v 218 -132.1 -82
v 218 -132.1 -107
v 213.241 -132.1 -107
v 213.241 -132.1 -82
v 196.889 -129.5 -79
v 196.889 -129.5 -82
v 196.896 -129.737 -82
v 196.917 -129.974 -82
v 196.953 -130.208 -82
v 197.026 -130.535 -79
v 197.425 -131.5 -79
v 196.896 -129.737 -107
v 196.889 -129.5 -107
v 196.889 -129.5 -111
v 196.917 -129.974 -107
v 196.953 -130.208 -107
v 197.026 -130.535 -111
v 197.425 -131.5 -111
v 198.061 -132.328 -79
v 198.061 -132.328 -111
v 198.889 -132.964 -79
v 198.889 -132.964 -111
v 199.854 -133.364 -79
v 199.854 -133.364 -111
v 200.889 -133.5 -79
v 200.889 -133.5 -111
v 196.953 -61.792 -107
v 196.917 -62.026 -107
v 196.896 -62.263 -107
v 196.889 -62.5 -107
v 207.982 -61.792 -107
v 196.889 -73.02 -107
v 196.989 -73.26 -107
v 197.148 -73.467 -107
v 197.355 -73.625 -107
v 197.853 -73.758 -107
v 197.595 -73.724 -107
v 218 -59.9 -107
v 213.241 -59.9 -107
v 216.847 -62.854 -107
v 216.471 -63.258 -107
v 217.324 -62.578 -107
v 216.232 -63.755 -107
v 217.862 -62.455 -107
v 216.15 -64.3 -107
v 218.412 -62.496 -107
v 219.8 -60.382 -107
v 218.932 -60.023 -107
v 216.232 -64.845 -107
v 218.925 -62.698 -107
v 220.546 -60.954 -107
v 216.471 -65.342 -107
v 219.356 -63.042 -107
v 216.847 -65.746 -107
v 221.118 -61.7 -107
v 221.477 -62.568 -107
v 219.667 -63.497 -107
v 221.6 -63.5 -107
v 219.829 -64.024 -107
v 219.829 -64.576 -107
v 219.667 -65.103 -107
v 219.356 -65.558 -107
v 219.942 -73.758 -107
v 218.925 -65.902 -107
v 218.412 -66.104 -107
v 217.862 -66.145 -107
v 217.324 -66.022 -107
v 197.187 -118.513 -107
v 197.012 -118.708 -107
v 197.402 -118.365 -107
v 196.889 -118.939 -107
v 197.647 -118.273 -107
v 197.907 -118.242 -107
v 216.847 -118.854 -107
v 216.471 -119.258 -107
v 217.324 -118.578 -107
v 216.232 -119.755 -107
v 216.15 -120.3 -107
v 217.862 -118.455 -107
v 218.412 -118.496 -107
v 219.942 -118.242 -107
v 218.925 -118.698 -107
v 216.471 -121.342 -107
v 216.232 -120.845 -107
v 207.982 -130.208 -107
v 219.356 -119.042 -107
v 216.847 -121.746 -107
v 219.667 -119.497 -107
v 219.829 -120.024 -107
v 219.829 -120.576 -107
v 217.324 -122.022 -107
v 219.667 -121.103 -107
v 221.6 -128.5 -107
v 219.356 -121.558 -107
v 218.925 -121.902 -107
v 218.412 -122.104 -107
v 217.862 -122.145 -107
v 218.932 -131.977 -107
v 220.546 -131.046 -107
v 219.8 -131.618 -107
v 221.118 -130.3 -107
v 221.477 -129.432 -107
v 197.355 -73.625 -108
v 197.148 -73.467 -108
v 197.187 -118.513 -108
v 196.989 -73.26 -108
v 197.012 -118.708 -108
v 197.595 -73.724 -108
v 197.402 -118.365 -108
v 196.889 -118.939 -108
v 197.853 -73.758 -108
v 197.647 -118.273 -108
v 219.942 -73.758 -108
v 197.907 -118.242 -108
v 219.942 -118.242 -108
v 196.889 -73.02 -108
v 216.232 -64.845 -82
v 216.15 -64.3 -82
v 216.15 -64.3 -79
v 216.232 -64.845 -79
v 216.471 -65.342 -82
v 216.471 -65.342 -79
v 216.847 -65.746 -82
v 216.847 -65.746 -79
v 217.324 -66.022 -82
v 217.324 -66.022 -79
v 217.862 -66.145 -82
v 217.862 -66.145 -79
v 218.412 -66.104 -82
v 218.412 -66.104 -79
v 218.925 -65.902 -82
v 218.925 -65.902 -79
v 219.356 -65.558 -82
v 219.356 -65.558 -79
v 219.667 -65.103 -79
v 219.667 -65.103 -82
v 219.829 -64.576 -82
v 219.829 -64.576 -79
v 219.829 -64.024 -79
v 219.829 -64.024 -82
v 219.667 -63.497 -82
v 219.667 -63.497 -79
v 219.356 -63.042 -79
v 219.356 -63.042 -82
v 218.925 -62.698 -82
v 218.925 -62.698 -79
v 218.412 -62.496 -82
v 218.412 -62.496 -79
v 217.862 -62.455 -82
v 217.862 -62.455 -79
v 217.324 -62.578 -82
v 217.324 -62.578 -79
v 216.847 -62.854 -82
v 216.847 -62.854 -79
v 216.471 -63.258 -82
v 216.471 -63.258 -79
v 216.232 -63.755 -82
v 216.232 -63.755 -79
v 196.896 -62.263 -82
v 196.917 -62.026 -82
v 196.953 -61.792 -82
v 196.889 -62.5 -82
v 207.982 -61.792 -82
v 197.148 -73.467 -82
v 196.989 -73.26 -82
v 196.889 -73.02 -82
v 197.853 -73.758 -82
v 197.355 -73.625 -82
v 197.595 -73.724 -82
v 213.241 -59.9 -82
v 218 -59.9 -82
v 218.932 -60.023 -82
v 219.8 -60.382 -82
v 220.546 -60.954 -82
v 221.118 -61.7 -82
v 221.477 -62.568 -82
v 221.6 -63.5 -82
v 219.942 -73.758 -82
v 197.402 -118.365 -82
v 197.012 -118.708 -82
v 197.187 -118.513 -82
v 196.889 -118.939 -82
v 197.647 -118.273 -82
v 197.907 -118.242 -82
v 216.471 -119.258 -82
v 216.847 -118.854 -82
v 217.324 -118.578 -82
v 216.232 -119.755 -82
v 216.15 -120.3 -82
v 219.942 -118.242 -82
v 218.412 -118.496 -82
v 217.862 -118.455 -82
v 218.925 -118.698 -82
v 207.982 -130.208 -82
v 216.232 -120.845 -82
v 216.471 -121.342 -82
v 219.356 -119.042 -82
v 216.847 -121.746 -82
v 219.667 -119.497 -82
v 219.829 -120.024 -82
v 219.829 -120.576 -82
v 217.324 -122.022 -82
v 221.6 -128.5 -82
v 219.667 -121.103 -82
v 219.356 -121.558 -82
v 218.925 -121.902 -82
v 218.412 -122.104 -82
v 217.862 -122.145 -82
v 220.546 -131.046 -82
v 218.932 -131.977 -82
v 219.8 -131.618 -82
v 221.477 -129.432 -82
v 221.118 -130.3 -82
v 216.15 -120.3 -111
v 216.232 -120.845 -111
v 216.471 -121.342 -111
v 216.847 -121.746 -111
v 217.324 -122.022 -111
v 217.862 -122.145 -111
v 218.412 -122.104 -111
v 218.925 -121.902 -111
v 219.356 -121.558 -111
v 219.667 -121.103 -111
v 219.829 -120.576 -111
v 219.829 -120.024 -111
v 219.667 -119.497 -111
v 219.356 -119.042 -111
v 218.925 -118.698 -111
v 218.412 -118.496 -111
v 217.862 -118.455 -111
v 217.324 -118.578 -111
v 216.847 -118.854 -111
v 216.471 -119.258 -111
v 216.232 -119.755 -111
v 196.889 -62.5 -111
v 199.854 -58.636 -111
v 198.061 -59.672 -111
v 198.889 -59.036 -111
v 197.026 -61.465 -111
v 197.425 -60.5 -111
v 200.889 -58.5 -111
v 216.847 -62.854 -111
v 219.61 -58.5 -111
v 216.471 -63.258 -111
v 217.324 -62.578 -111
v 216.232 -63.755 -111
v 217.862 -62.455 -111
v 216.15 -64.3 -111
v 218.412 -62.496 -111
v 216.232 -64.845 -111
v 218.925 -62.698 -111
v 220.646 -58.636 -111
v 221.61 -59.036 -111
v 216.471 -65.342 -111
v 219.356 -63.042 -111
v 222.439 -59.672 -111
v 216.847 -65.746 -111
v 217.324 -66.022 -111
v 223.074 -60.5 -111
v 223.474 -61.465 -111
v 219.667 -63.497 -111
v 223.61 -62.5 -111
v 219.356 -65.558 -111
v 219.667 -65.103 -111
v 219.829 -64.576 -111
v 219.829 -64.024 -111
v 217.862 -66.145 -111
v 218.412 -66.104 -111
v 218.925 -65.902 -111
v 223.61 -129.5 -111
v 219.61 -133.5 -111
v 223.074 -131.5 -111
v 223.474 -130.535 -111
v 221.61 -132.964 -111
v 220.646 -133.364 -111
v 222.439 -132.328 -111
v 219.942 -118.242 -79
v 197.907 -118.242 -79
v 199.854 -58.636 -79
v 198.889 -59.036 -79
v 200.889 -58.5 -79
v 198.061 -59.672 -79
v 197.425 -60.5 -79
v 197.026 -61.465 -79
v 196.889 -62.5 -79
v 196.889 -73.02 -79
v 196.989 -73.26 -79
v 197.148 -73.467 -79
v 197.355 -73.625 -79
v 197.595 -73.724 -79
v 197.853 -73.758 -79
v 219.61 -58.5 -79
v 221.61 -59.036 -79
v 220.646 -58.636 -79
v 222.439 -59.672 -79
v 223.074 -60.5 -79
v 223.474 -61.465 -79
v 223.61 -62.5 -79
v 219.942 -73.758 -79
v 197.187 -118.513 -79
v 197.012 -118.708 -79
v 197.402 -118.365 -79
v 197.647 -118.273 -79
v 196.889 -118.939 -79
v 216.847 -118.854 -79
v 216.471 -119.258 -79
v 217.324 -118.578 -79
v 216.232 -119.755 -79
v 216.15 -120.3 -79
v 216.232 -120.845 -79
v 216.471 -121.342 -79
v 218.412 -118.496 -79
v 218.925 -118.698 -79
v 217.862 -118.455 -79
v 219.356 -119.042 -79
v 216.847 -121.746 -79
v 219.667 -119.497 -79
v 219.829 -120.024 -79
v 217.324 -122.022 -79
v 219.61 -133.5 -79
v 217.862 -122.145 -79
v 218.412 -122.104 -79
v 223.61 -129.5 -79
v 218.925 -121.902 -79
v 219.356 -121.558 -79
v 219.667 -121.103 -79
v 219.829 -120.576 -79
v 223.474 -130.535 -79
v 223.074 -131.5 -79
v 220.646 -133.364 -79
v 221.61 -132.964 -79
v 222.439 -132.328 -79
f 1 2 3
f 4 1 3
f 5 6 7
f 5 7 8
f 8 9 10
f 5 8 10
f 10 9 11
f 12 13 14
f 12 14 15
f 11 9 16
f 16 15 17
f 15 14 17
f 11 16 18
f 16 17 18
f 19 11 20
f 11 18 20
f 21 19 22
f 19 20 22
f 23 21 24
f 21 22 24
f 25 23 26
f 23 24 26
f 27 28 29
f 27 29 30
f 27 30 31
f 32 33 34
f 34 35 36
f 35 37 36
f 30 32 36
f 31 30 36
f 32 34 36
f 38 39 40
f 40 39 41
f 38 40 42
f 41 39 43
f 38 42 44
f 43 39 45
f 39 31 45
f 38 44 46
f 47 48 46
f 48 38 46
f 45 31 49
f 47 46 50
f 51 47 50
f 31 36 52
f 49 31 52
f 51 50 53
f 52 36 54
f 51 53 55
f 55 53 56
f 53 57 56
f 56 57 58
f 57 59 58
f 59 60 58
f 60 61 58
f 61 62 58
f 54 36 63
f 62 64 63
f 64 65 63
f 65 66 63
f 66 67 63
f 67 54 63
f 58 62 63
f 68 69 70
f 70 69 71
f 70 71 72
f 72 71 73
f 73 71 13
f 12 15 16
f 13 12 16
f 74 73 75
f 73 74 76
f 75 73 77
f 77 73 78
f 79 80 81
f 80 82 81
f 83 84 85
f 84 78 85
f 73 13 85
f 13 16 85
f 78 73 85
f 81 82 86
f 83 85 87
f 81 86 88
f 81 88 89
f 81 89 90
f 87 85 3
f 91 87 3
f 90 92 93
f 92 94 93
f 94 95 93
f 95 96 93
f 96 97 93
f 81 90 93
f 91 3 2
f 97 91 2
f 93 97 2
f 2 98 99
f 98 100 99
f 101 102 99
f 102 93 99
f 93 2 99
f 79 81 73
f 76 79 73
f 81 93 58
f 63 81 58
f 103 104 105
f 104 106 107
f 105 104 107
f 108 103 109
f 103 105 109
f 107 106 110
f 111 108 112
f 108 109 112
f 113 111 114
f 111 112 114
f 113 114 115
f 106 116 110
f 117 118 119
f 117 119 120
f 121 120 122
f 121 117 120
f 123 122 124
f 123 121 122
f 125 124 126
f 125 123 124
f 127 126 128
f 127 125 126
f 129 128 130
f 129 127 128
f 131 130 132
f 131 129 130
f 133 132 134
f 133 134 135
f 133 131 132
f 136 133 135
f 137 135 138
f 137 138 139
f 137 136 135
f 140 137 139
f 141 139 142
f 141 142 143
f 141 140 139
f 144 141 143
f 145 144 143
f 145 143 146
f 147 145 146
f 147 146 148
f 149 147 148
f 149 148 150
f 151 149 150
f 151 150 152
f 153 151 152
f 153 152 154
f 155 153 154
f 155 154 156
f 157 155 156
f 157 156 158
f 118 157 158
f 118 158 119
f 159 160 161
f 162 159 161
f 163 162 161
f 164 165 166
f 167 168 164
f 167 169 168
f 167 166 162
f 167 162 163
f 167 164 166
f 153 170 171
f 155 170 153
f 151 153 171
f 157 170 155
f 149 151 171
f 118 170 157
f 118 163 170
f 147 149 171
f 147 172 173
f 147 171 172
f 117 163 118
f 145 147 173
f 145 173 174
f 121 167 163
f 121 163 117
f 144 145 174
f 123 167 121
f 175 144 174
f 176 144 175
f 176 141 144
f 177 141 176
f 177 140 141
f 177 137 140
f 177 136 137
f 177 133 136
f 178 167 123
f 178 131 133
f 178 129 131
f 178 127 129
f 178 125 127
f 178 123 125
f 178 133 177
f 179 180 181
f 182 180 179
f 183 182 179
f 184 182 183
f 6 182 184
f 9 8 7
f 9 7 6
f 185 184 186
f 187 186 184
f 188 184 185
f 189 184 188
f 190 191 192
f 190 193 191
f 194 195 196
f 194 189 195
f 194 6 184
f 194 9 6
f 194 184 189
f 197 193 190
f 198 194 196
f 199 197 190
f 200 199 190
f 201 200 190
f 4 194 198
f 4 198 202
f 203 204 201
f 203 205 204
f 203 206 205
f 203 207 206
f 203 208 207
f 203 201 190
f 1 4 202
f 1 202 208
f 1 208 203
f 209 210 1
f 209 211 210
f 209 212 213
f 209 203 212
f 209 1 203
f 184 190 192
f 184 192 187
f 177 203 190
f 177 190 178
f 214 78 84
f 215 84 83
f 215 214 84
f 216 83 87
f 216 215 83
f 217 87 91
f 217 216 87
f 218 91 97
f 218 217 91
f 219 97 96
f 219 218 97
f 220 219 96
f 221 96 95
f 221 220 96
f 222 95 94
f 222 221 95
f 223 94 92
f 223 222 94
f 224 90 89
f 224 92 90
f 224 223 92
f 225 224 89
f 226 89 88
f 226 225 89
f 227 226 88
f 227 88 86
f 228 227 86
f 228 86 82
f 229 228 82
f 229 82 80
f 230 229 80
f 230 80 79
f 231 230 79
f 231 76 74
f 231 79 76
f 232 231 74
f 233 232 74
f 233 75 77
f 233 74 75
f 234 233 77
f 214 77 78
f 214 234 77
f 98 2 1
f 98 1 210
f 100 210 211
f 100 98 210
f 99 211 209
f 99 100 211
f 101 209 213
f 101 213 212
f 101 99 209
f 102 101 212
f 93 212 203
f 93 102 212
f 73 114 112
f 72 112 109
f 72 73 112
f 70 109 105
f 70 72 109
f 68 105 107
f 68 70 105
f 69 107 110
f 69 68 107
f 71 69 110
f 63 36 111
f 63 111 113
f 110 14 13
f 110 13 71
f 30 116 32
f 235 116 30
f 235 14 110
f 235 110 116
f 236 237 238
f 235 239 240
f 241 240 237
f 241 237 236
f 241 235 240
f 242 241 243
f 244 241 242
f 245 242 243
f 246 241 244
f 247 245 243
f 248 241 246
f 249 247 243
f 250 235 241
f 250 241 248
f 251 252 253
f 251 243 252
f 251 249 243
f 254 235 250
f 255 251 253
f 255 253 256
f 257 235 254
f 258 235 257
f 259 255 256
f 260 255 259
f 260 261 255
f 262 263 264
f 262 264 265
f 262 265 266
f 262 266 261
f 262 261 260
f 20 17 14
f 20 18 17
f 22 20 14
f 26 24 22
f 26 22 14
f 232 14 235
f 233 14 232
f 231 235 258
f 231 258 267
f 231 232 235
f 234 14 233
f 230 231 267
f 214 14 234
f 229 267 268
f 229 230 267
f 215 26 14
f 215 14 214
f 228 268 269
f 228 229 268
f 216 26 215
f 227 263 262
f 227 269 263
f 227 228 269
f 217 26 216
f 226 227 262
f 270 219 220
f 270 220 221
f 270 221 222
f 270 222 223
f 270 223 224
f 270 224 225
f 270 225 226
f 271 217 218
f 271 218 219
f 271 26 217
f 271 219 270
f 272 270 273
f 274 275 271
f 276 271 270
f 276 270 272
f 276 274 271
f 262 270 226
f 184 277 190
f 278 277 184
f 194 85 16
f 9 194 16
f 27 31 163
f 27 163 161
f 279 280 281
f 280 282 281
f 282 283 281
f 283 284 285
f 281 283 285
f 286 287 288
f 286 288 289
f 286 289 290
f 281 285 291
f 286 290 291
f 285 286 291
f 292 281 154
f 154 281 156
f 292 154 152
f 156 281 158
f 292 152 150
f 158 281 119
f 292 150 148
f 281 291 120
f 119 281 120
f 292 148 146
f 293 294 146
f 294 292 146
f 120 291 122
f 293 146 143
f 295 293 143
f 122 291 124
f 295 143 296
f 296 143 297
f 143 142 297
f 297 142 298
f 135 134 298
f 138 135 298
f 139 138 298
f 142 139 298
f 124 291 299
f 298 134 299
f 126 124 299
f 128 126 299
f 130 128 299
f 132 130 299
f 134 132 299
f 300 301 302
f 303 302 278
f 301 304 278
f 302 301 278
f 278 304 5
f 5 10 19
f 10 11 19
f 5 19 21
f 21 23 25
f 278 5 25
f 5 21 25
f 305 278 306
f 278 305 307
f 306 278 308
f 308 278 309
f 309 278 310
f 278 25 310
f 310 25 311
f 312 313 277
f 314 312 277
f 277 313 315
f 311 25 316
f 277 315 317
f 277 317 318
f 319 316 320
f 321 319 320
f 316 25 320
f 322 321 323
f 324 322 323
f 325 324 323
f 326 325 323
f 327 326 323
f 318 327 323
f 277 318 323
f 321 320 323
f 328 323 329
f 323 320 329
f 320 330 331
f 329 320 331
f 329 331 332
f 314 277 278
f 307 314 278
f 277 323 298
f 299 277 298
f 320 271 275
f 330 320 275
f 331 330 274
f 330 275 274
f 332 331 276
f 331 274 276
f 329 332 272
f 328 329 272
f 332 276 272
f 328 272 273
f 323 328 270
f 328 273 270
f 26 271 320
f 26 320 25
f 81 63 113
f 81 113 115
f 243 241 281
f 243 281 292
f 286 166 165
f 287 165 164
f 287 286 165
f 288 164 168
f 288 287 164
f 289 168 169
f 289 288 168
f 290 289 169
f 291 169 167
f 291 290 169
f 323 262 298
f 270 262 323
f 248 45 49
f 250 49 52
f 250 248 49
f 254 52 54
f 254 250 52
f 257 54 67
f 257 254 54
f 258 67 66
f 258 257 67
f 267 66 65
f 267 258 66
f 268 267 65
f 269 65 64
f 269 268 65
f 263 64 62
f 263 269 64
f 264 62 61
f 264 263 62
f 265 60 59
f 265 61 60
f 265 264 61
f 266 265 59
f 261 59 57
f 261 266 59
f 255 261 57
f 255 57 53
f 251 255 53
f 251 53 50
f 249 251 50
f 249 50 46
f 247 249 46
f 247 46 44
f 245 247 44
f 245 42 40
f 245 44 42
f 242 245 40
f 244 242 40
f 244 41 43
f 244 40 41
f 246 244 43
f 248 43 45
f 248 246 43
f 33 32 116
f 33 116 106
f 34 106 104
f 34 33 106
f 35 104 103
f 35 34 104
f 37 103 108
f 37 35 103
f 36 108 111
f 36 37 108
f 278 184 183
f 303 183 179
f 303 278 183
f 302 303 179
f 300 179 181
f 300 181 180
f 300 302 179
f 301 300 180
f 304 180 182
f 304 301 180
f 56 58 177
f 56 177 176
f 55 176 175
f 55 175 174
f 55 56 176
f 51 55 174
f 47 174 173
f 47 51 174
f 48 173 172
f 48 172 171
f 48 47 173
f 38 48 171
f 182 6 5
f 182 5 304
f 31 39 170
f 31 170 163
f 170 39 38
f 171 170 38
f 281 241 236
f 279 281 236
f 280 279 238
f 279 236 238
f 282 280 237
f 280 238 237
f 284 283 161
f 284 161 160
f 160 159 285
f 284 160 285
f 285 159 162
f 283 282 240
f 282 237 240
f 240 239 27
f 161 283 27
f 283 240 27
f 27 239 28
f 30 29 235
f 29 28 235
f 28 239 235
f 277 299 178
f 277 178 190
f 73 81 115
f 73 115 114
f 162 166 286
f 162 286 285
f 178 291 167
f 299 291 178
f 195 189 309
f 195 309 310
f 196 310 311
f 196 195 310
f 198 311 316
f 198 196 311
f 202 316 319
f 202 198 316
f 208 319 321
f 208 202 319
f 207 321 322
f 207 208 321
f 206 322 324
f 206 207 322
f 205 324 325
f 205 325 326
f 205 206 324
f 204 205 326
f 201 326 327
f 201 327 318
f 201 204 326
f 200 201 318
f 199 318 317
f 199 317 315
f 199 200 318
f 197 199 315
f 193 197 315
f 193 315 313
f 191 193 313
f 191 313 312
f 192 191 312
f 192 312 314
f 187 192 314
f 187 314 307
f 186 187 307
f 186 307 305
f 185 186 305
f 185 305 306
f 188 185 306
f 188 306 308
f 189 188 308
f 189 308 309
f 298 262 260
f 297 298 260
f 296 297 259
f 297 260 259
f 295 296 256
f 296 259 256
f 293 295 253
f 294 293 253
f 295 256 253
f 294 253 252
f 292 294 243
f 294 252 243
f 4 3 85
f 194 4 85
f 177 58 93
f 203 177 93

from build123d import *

# Parameters (mm, degrees)
SKETCH815_R             = 1.85
PAD351_DEPTH            = 32
POCKET_DEPTH            = 62
POCKET223_DEPTH         = 25
BODY022_PLACEMENT_ANGLE = 180


with BuildPart() as part:
    # Sketch815 → Pad351 (new body)
    with BuildSketch(Plane.XY):
        with BuildLine():
            Line((-1.610327, 37.5), (17.110638, 37.5))
            ThreePointArc((21.110638, 33.5), (19.939065, 36.328427), (17.110638, 37.5))
            Line((21.110638, 33.5), (21.110638, -33.5))
            ThreePointArc((17.110638, -37.5), (19.939065, -36.328427), (21.110638, -33.5))
            Line((17.110638, -37.5), (-1.610327, -37.5))
            ThreePointArc((-5.610327, -33.5), (-4.438754, -36.328427), (-1.610327, -37.5))
            Line((-5.610327, -33.5), (-5.610327, 33.5))
            ThreePointArc((-1.610327, 37.5), (-4.438754, 36.328427), (-5.610327, 33.5))
        make_face()
        with Locations((0, 24.3)):
            Circle(SKETCH815_R, mode=Mode.SUBTRACT)
        with Locations((0, -31.7)):
            Circle(SKETCH815_R, mode=Mode.SUBTRACT)
    extrude(amount=PAD351_DEPTH)

    # Sketch816 → Pocket (cut)
    with BuildSketch(Plane.XY.offset(65)):
        with BuildLine():
            Line((-1.941559, 22.241577), (20.093479, 22.241577))
            ThreePointArc((20.093479, 22.241577), (20.864733, 22.561041), (21.184197, 23.332295))
            Line((21.184197, 23.332295), (21.184197, 25.813278))
            Line((21.184197, 25.813278), (30.338089, 25.813278))
            Line((30.338089, 25.813278), (30.338089, 22.183402))
            Line((30.338089, 22.183402), (30.338089, -22.183402))
            Line((30.338089, -26.656548), (30.338089, -22.183402))
            Line((21.144989, -26.656548), (30.338089, -26.656548))
            Line((21.144989, -23.239975), (21.144989, -26.656548))
            ThreePointArc((21.144989, -23.239975), (20.852565, -22.534001), (20.146591, -22.241577))
            Line((20.146591, -22.241577), (-1.941559, -22.241577))
            Line((-1.941559, -22.241577), (-1.941559, 22.241577))
        make_face()
    extrude(amount=-POCKET_DEPTH, mode=Mode.SUBTRACT)

    # Sketch817 → Pocket223 (cut)
    with BuildSketch(Plane.XY.offset(4)):
        with BuildLine():
            Line((0, 36.1), (4.759236, 36.1))
            Line((4.759236, 36.1), (10.017961, 34.208318))
            Line((10.017961, 34.208318), (31.19193, 34.208318))
            Line((31.19193, 34.208318), (31.19193, -34.208318))
            Line((10.017961, -34.208318), (31.19193, -34.208318))
            Line((4.759236, -36.1), (10.017961, -34.208318))
            Line((4.759236, -36.1), (0, -36.1))
            ThreePointArc((-3.6, -32.5), (-2.545584, -35.045584), (0, -36.1))
            Line((-3.6, -32.5), (-3.6, 32.5))
            ThreePointArc((0, 36.1), (-2.545584, 35.045584), (-3.6, 32.5))
        make_face()
    extrude(amount=POCKET223_DEPTH, mode=Mode.SUBTRACT)


with BuildPart() as part_1:
    # Body022 placement: moved
    add(part.part.moved(Location((218, -96, -111))).rotate(Axis((218, -96, -111), (0, 0, 1)), BODY022_PLACEMENT_ANGLE))


solid = part_1.part
